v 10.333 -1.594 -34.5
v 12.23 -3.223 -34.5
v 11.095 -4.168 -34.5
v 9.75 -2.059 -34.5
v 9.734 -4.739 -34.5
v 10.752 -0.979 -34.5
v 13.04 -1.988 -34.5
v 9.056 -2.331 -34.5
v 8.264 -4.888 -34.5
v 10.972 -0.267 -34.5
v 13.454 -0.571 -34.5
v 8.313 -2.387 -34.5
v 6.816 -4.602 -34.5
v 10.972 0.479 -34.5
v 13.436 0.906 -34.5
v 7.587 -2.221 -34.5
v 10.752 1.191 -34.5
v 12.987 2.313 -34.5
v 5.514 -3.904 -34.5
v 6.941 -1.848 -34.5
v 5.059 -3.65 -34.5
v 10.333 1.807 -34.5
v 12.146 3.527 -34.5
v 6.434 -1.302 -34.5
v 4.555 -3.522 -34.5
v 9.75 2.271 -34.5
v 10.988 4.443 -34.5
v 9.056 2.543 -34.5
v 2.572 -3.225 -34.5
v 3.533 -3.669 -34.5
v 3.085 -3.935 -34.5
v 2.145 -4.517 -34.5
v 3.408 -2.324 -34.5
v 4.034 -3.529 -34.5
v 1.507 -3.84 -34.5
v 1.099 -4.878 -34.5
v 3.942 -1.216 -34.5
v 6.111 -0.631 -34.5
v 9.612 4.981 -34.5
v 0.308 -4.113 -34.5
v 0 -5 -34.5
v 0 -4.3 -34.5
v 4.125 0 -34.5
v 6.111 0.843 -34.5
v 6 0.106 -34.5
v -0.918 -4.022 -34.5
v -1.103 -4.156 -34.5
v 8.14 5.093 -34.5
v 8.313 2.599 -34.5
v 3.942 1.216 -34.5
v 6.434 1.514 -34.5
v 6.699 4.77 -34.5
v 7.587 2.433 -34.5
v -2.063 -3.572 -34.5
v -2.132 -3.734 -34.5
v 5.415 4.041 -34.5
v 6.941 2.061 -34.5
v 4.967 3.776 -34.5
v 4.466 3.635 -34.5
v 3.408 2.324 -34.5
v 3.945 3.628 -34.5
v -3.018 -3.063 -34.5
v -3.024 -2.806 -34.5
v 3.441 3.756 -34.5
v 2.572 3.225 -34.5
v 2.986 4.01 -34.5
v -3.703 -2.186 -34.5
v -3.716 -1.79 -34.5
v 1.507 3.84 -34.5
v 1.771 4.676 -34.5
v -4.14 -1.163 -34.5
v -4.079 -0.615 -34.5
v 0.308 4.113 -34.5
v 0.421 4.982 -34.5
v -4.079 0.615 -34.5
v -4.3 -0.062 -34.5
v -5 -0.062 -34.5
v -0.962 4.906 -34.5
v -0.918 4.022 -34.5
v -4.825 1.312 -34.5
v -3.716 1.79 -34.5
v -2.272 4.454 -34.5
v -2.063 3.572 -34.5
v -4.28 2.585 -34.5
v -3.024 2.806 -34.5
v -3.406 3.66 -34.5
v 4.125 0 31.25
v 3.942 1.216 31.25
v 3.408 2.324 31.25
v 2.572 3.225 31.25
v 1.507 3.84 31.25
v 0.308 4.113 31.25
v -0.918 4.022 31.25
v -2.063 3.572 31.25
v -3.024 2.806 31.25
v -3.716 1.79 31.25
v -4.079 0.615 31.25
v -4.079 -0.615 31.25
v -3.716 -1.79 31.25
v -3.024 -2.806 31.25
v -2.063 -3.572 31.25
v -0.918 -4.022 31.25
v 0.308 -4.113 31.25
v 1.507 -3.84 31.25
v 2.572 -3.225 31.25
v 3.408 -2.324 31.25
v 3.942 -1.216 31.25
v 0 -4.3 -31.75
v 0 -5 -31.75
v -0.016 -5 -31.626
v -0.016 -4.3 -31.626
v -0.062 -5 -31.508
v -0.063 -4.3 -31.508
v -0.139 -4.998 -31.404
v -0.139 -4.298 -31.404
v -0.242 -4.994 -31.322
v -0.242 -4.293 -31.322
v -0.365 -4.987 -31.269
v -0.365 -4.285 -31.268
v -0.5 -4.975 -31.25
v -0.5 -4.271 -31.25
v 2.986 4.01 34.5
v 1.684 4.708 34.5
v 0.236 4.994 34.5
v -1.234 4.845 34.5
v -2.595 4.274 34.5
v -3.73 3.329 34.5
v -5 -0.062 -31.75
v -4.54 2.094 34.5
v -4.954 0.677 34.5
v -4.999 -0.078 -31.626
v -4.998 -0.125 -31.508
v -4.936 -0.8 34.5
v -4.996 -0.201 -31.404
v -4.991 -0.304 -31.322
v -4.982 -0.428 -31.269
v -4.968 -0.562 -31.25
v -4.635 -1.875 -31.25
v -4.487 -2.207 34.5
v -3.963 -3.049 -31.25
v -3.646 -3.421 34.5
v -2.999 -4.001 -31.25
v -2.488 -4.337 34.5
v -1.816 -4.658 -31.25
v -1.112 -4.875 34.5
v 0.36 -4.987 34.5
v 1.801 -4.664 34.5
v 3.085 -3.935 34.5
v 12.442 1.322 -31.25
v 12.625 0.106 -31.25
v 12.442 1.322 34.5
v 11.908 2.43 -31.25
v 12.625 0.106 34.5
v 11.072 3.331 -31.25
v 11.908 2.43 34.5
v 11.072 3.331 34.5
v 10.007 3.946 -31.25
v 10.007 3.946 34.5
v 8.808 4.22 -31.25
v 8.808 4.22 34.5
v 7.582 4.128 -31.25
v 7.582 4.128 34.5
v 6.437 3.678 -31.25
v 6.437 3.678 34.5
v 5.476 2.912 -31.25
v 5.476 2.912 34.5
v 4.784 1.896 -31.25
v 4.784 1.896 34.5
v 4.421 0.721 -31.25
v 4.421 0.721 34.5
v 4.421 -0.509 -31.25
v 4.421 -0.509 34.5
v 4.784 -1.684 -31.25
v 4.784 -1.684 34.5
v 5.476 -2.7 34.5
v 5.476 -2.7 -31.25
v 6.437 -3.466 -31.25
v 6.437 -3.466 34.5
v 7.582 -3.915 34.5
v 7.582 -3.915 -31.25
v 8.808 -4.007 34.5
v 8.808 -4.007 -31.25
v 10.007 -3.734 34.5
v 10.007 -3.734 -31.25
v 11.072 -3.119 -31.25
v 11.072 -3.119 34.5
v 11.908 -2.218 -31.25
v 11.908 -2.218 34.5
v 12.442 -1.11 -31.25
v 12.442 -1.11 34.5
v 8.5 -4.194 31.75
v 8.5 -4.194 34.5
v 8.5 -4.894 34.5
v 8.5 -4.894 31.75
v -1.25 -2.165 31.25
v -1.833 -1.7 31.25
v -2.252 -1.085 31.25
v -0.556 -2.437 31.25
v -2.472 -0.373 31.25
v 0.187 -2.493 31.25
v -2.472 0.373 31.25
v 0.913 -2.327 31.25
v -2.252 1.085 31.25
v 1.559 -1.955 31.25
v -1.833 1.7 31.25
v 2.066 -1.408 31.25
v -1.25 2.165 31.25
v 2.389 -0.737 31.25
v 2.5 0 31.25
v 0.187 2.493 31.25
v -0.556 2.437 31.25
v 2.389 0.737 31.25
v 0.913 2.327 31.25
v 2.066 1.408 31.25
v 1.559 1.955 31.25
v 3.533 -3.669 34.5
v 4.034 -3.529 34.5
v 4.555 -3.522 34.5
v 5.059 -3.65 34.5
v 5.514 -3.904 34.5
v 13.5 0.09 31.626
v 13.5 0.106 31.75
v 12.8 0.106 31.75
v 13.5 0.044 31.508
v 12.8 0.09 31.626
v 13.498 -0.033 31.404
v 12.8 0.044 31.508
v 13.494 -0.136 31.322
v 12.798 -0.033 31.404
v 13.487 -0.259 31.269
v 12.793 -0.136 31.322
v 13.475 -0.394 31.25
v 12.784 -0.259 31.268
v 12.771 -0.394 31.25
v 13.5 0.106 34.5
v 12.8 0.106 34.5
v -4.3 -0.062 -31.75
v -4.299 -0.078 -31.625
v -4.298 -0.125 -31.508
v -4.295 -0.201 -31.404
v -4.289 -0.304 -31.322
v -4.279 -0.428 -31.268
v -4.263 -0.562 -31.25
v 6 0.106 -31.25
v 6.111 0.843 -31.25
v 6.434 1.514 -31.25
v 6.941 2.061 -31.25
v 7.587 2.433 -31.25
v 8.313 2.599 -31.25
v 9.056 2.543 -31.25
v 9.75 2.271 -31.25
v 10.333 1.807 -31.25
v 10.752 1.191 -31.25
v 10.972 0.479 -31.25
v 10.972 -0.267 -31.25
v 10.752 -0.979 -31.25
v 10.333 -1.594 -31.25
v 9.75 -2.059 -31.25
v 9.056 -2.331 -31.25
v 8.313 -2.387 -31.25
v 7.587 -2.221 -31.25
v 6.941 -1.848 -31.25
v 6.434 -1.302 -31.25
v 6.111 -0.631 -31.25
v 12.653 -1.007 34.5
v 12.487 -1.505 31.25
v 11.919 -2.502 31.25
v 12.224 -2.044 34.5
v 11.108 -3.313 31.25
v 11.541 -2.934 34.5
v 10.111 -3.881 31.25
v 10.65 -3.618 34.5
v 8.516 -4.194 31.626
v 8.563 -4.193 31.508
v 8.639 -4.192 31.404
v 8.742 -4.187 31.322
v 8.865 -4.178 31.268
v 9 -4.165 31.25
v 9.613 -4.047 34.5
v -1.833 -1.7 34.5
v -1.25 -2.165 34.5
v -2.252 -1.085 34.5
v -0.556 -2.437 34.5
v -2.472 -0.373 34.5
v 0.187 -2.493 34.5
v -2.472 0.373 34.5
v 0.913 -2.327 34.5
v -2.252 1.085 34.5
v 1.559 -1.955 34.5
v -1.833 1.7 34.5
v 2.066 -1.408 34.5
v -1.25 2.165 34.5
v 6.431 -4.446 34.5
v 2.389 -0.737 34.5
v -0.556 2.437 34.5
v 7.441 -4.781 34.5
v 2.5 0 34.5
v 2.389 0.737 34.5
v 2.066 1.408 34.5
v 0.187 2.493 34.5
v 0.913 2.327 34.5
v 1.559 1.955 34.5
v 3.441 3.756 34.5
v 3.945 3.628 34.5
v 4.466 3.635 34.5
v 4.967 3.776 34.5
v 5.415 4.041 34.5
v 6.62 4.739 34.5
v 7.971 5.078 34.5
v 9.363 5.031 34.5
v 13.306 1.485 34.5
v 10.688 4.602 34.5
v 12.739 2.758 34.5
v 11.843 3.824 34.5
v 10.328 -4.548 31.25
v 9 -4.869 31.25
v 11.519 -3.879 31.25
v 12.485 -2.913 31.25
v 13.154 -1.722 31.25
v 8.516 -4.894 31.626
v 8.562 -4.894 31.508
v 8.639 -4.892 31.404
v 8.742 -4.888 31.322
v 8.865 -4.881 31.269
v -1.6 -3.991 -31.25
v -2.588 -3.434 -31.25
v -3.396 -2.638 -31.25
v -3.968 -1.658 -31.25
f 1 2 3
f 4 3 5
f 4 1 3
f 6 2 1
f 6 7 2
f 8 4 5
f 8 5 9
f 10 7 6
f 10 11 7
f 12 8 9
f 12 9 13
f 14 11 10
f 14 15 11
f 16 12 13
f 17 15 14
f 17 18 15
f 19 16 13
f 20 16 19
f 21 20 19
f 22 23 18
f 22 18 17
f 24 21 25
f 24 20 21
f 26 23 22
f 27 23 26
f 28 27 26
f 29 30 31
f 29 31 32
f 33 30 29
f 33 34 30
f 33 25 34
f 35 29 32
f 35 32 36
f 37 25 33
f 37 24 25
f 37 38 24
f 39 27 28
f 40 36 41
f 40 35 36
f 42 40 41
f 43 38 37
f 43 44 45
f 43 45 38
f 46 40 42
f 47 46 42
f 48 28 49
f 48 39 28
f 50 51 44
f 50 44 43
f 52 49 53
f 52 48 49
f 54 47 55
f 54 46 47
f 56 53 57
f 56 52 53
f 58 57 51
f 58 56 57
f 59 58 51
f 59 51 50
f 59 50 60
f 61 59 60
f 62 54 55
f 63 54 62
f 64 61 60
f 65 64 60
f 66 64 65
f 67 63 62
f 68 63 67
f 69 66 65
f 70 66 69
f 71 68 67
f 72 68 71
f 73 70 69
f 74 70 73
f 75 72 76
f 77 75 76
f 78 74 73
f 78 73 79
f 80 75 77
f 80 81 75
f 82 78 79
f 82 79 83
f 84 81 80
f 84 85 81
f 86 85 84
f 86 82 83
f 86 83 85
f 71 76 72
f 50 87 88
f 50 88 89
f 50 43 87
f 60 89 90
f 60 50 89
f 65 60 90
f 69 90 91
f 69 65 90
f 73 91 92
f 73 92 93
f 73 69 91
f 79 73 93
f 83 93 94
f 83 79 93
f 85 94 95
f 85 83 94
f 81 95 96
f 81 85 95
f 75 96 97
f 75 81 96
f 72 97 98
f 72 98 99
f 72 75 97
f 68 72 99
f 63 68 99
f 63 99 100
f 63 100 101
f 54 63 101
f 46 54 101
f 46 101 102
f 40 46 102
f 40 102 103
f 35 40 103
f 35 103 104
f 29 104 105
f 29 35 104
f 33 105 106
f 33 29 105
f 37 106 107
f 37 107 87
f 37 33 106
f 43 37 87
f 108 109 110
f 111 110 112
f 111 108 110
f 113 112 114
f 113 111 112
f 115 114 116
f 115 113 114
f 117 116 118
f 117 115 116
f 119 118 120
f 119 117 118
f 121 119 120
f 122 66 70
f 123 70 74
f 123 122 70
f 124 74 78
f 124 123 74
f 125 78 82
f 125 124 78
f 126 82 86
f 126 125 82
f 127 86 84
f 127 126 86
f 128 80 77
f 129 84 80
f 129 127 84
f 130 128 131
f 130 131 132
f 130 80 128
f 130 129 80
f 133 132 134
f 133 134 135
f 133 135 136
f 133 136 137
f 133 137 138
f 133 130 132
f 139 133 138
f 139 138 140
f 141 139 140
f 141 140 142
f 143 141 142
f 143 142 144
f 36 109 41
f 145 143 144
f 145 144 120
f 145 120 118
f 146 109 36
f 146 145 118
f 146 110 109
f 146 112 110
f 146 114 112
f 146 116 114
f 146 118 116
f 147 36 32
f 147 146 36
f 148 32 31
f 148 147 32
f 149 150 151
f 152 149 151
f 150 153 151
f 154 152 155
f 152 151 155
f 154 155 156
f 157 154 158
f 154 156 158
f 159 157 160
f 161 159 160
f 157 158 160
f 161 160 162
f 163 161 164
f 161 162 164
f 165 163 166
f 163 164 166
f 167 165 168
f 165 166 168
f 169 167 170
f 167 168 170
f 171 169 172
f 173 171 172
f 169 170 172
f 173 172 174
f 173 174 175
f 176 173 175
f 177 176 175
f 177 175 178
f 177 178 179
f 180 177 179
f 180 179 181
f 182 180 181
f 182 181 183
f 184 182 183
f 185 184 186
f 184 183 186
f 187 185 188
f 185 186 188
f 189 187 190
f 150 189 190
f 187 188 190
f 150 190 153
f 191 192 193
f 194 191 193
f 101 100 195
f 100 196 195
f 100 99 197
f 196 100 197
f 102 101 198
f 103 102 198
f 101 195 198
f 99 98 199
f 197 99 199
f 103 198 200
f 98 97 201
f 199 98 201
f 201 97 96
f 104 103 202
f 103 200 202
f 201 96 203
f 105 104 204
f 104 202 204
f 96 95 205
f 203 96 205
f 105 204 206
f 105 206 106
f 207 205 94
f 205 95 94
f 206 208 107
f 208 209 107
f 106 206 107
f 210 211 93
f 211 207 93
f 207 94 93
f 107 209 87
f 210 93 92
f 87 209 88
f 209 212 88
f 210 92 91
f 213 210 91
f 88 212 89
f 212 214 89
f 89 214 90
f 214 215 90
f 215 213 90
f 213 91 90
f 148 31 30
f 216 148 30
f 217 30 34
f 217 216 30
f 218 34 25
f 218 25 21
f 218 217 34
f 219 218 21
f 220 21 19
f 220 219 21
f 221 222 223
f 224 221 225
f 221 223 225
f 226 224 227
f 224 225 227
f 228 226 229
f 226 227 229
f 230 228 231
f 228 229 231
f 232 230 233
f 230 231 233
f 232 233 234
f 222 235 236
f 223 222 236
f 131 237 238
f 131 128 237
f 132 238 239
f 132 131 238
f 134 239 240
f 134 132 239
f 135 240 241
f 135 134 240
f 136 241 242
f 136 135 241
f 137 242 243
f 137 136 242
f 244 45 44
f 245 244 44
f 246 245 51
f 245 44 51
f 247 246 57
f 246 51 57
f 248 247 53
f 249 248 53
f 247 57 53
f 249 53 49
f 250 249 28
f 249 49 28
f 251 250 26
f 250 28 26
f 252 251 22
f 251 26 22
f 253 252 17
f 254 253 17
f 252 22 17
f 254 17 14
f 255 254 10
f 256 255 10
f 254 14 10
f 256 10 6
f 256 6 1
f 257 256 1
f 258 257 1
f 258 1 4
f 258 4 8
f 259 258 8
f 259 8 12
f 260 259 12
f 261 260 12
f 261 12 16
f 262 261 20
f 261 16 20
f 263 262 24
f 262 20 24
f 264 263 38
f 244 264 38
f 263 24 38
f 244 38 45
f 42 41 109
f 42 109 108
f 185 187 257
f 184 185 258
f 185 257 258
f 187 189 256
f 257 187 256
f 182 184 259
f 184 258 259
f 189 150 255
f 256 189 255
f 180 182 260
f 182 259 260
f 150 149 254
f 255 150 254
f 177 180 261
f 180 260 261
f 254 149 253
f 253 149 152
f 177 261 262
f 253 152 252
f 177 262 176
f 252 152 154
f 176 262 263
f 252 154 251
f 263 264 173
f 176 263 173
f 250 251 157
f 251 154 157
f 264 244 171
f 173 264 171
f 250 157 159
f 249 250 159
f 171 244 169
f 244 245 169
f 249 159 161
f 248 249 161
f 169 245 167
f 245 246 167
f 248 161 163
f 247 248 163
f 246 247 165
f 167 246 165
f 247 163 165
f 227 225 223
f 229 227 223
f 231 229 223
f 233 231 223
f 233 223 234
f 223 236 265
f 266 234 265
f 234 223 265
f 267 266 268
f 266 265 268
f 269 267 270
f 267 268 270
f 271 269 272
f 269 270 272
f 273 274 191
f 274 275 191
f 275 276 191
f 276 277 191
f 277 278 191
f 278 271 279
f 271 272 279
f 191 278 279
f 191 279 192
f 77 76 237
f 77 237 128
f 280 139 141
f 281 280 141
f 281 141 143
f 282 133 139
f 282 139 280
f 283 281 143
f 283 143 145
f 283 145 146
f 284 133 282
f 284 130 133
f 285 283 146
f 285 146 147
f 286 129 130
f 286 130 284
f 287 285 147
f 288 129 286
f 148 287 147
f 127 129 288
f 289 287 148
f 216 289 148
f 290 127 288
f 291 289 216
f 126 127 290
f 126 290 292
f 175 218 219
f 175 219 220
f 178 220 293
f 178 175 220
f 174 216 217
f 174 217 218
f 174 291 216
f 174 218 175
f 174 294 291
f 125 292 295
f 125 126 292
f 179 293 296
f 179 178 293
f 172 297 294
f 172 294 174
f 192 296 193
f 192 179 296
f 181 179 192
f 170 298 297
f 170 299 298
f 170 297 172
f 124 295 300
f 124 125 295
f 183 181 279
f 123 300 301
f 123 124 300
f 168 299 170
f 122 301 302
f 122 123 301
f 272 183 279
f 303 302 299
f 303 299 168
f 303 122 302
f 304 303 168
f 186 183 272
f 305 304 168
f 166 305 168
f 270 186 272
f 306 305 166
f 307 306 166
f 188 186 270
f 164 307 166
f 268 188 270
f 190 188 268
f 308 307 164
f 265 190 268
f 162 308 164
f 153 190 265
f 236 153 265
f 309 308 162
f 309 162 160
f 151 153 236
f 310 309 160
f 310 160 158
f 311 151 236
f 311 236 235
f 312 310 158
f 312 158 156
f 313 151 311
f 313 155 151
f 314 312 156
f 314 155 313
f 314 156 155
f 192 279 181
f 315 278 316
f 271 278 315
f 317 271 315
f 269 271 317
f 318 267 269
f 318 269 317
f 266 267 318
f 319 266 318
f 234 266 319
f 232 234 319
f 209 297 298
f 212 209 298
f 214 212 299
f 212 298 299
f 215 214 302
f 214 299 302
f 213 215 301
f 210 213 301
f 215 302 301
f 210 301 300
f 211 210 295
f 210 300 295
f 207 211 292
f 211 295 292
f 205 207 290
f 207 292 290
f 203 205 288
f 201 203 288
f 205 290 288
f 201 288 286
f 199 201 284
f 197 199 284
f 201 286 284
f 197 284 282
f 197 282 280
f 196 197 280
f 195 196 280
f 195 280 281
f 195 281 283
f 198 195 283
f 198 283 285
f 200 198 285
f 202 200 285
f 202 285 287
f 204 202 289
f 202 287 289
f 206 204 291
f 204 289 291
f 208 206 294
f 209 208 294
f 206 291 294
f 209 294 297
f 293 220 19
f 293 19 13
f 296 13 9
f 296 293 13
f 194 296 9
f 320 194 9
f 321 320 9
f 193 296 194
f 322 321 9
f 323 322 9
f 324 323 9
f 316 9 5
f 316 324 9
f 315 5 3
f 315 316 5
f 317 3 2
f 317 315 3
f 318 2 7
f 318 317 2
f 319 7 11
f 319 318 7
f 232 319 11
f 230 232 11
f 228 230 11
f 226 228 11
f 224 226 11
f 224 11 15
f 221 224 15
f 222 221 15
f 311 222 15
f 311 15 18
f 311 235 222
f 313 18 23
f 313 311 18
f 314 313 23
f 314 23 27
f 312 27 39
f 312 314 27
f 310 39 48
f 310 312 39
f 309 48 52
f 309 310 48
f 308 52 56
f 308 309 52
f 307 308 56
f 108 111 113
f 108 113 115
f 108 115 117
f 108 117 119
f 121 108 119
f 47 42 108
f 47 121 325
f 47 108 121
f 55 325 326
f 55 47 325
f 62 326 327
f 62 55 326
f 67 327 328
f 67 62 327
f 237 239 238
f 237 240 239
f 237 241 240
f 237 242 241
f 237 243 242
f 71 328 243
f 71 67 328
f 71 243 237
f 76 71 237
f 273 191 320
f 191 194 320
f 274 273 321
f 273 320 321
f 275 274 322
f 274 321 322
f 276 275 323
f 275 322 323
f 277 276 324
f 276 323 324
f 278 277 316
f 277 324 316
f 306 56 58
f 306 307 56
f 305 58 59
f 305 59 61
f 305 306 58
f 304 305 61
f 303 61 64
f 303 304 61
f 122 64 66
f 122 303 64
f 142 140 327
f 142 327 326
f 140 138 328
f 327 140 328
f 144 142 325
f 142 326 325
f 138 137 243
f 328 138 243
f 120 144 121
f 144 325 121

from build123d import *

# Parameters (mm, degrees)
BOSS_EXTRUDE1_DEPTH = 34.5
SKETCH2_R           = 4.125
CUT_EXTRUDE1_DEPTH  = 34.5
SKETCH3_R           = 4.125
SKETCH3_R_2         = 2.5
BOSS_EXTRUDE2_DEPTH = 3.25
SKETCH5_R           = 4.125
SKETCH5_R_2         = 2.5
BOSS_EXTRUDE4_DEPTH = 3.25
CUT_EXTRUDE3_DEPTH  = 3.25
FILLET1_R           = 0.5
CUT_EXTRUDE4_DEPTH  = 3.25
FILLET2_R           = 0.5


with BuildPart() as part:
    # Sketch1 → Boss-Extrude1 (new body, symmetric)
    with BuildSketch(Plane.XY):
        with BuildLine():
            ThreePointArc((2.986131566, 4.010363858), (-4.999610571, -0.062403009), (3.085297006, -3.934582873))
            ThreePointArc((3.085297006, -3.934582873), (4.294454604, -3.508571794), (5.513868434, -3.904270479))
            ThreePointArc((5.513868434, -3.904270479), (13.499610571, 0.168496387), (5.414702994, 4.040676252))
            ThreePointArc((5.414702994, 4.040676252), (4.205545396, 3.614665172), (2.986131566, 4.010363858))
        make_face()
    extrude(amount=BOSS_EXTRUDE1_DEPTH, both=True)

    # Sketch2 → Cut-Extrude1 (cut, symmetric)
    with BuildSketch(Plane.XY):
        Circle(SKETCH2_R)
        with Locations((8.5, 0.106093378)):
            Circle(SKETCH2_R)
    extrude(amount=CUT_EXTRUDE1_DEPTH, both=True, mode=Mode.SUBTRACT)

    # Sketch3 → Boss-Extrude2 (add)
    with BuildSketch(Plane.XY.offset(34.5)):
        Circle(SKETCH3_R)
        Circle(SKETCH3_R_2, mode=Mode.SUBTRACT)
    extrude(amount=-BOSS_EXTRUDE2_DEPTH)

    # Sketch5 → Boss-Extrude4 (add)
    with BuildSketch(Plane(origin=(0, 0, -34.5), x_dir=(-1, 0, 0), z_dir=(0, 0, -1))):
        with Locations((-8.5, 0.106093378)):
            Circle(SKETCH5_R)
        with Locations((-8.5, 0.106093378)):
            Circle(SKETCH5_R_2, mode=Mode.SUBTRACT)
    extrude(amount=-BOSS_EXTRUDE4_DEPTH)

    # Sketch6 → Cut-Extrude3 (cut)
    with BuildSketch(Plane(origin=(0, 0, -34.5), x_dir=(-1, 0, 0), z_dir=(0, 0, -1))):
        with BuildLine():
            Line((4.299610571, -0.062403009), (4.999610571, -0.062403009))
            ThreePointArc((4.999610571, -0.062403009), (3.513401838, -3.557528288), (0, -5))
            Line((0, -5), (0, -4.300063395))
            ThreePointArc((0, -4.300063395), (3.01846056, -3.062587313), (4.299610571, -0.062403009))
        make_face()
    extrude(amount=-CUT_EXTRUDE3_DEPTH, mode=Mode.SUBTRACT)

    # Fillet1
    fillet1_edges = [part.edges().sort_by_distance(p)[0] for p in [
        (0, -4.650031697, -31.25),
        (-4.649610571, -0.062403009, -31.25),
    ]]
    fillet(fillet1_edges, radius=FILLET1_R)

    # Sketch7 → Cut-Extrude4 (cut)
    with BuildSketch(Plane.XY.offset(34.5)):
        with BuildLine():
            Line((13.5, 0.106093378), (12.8, 0.106093378))
            ThreePointArc((12.8, 0.106093378), (11.540559159, -2.934465781), (8.5, -4.193906622))
            Line((8.5, -4.193906622), (8.5, -4.893906622))
            ThreePointArc((8.5, -4.893906622), (12.035533906, -3.429440528), (13.5, 0.106093378))
        make_face()
    extrude(amount=-CUT_EXTRUDE4_DEPTH, mode=Mode.SUBTRACT)

    # Fillet2
    fillet2_edges = [part.edges().sort_by_distance(p)[0] for p in [
        (8.5, -4.543906622, 31.25),
        (13.15, 0.106093378, 31.25),
    ]]
    fillet(fillet2_edges, radius=FILLET2_R)


solid = part.part
